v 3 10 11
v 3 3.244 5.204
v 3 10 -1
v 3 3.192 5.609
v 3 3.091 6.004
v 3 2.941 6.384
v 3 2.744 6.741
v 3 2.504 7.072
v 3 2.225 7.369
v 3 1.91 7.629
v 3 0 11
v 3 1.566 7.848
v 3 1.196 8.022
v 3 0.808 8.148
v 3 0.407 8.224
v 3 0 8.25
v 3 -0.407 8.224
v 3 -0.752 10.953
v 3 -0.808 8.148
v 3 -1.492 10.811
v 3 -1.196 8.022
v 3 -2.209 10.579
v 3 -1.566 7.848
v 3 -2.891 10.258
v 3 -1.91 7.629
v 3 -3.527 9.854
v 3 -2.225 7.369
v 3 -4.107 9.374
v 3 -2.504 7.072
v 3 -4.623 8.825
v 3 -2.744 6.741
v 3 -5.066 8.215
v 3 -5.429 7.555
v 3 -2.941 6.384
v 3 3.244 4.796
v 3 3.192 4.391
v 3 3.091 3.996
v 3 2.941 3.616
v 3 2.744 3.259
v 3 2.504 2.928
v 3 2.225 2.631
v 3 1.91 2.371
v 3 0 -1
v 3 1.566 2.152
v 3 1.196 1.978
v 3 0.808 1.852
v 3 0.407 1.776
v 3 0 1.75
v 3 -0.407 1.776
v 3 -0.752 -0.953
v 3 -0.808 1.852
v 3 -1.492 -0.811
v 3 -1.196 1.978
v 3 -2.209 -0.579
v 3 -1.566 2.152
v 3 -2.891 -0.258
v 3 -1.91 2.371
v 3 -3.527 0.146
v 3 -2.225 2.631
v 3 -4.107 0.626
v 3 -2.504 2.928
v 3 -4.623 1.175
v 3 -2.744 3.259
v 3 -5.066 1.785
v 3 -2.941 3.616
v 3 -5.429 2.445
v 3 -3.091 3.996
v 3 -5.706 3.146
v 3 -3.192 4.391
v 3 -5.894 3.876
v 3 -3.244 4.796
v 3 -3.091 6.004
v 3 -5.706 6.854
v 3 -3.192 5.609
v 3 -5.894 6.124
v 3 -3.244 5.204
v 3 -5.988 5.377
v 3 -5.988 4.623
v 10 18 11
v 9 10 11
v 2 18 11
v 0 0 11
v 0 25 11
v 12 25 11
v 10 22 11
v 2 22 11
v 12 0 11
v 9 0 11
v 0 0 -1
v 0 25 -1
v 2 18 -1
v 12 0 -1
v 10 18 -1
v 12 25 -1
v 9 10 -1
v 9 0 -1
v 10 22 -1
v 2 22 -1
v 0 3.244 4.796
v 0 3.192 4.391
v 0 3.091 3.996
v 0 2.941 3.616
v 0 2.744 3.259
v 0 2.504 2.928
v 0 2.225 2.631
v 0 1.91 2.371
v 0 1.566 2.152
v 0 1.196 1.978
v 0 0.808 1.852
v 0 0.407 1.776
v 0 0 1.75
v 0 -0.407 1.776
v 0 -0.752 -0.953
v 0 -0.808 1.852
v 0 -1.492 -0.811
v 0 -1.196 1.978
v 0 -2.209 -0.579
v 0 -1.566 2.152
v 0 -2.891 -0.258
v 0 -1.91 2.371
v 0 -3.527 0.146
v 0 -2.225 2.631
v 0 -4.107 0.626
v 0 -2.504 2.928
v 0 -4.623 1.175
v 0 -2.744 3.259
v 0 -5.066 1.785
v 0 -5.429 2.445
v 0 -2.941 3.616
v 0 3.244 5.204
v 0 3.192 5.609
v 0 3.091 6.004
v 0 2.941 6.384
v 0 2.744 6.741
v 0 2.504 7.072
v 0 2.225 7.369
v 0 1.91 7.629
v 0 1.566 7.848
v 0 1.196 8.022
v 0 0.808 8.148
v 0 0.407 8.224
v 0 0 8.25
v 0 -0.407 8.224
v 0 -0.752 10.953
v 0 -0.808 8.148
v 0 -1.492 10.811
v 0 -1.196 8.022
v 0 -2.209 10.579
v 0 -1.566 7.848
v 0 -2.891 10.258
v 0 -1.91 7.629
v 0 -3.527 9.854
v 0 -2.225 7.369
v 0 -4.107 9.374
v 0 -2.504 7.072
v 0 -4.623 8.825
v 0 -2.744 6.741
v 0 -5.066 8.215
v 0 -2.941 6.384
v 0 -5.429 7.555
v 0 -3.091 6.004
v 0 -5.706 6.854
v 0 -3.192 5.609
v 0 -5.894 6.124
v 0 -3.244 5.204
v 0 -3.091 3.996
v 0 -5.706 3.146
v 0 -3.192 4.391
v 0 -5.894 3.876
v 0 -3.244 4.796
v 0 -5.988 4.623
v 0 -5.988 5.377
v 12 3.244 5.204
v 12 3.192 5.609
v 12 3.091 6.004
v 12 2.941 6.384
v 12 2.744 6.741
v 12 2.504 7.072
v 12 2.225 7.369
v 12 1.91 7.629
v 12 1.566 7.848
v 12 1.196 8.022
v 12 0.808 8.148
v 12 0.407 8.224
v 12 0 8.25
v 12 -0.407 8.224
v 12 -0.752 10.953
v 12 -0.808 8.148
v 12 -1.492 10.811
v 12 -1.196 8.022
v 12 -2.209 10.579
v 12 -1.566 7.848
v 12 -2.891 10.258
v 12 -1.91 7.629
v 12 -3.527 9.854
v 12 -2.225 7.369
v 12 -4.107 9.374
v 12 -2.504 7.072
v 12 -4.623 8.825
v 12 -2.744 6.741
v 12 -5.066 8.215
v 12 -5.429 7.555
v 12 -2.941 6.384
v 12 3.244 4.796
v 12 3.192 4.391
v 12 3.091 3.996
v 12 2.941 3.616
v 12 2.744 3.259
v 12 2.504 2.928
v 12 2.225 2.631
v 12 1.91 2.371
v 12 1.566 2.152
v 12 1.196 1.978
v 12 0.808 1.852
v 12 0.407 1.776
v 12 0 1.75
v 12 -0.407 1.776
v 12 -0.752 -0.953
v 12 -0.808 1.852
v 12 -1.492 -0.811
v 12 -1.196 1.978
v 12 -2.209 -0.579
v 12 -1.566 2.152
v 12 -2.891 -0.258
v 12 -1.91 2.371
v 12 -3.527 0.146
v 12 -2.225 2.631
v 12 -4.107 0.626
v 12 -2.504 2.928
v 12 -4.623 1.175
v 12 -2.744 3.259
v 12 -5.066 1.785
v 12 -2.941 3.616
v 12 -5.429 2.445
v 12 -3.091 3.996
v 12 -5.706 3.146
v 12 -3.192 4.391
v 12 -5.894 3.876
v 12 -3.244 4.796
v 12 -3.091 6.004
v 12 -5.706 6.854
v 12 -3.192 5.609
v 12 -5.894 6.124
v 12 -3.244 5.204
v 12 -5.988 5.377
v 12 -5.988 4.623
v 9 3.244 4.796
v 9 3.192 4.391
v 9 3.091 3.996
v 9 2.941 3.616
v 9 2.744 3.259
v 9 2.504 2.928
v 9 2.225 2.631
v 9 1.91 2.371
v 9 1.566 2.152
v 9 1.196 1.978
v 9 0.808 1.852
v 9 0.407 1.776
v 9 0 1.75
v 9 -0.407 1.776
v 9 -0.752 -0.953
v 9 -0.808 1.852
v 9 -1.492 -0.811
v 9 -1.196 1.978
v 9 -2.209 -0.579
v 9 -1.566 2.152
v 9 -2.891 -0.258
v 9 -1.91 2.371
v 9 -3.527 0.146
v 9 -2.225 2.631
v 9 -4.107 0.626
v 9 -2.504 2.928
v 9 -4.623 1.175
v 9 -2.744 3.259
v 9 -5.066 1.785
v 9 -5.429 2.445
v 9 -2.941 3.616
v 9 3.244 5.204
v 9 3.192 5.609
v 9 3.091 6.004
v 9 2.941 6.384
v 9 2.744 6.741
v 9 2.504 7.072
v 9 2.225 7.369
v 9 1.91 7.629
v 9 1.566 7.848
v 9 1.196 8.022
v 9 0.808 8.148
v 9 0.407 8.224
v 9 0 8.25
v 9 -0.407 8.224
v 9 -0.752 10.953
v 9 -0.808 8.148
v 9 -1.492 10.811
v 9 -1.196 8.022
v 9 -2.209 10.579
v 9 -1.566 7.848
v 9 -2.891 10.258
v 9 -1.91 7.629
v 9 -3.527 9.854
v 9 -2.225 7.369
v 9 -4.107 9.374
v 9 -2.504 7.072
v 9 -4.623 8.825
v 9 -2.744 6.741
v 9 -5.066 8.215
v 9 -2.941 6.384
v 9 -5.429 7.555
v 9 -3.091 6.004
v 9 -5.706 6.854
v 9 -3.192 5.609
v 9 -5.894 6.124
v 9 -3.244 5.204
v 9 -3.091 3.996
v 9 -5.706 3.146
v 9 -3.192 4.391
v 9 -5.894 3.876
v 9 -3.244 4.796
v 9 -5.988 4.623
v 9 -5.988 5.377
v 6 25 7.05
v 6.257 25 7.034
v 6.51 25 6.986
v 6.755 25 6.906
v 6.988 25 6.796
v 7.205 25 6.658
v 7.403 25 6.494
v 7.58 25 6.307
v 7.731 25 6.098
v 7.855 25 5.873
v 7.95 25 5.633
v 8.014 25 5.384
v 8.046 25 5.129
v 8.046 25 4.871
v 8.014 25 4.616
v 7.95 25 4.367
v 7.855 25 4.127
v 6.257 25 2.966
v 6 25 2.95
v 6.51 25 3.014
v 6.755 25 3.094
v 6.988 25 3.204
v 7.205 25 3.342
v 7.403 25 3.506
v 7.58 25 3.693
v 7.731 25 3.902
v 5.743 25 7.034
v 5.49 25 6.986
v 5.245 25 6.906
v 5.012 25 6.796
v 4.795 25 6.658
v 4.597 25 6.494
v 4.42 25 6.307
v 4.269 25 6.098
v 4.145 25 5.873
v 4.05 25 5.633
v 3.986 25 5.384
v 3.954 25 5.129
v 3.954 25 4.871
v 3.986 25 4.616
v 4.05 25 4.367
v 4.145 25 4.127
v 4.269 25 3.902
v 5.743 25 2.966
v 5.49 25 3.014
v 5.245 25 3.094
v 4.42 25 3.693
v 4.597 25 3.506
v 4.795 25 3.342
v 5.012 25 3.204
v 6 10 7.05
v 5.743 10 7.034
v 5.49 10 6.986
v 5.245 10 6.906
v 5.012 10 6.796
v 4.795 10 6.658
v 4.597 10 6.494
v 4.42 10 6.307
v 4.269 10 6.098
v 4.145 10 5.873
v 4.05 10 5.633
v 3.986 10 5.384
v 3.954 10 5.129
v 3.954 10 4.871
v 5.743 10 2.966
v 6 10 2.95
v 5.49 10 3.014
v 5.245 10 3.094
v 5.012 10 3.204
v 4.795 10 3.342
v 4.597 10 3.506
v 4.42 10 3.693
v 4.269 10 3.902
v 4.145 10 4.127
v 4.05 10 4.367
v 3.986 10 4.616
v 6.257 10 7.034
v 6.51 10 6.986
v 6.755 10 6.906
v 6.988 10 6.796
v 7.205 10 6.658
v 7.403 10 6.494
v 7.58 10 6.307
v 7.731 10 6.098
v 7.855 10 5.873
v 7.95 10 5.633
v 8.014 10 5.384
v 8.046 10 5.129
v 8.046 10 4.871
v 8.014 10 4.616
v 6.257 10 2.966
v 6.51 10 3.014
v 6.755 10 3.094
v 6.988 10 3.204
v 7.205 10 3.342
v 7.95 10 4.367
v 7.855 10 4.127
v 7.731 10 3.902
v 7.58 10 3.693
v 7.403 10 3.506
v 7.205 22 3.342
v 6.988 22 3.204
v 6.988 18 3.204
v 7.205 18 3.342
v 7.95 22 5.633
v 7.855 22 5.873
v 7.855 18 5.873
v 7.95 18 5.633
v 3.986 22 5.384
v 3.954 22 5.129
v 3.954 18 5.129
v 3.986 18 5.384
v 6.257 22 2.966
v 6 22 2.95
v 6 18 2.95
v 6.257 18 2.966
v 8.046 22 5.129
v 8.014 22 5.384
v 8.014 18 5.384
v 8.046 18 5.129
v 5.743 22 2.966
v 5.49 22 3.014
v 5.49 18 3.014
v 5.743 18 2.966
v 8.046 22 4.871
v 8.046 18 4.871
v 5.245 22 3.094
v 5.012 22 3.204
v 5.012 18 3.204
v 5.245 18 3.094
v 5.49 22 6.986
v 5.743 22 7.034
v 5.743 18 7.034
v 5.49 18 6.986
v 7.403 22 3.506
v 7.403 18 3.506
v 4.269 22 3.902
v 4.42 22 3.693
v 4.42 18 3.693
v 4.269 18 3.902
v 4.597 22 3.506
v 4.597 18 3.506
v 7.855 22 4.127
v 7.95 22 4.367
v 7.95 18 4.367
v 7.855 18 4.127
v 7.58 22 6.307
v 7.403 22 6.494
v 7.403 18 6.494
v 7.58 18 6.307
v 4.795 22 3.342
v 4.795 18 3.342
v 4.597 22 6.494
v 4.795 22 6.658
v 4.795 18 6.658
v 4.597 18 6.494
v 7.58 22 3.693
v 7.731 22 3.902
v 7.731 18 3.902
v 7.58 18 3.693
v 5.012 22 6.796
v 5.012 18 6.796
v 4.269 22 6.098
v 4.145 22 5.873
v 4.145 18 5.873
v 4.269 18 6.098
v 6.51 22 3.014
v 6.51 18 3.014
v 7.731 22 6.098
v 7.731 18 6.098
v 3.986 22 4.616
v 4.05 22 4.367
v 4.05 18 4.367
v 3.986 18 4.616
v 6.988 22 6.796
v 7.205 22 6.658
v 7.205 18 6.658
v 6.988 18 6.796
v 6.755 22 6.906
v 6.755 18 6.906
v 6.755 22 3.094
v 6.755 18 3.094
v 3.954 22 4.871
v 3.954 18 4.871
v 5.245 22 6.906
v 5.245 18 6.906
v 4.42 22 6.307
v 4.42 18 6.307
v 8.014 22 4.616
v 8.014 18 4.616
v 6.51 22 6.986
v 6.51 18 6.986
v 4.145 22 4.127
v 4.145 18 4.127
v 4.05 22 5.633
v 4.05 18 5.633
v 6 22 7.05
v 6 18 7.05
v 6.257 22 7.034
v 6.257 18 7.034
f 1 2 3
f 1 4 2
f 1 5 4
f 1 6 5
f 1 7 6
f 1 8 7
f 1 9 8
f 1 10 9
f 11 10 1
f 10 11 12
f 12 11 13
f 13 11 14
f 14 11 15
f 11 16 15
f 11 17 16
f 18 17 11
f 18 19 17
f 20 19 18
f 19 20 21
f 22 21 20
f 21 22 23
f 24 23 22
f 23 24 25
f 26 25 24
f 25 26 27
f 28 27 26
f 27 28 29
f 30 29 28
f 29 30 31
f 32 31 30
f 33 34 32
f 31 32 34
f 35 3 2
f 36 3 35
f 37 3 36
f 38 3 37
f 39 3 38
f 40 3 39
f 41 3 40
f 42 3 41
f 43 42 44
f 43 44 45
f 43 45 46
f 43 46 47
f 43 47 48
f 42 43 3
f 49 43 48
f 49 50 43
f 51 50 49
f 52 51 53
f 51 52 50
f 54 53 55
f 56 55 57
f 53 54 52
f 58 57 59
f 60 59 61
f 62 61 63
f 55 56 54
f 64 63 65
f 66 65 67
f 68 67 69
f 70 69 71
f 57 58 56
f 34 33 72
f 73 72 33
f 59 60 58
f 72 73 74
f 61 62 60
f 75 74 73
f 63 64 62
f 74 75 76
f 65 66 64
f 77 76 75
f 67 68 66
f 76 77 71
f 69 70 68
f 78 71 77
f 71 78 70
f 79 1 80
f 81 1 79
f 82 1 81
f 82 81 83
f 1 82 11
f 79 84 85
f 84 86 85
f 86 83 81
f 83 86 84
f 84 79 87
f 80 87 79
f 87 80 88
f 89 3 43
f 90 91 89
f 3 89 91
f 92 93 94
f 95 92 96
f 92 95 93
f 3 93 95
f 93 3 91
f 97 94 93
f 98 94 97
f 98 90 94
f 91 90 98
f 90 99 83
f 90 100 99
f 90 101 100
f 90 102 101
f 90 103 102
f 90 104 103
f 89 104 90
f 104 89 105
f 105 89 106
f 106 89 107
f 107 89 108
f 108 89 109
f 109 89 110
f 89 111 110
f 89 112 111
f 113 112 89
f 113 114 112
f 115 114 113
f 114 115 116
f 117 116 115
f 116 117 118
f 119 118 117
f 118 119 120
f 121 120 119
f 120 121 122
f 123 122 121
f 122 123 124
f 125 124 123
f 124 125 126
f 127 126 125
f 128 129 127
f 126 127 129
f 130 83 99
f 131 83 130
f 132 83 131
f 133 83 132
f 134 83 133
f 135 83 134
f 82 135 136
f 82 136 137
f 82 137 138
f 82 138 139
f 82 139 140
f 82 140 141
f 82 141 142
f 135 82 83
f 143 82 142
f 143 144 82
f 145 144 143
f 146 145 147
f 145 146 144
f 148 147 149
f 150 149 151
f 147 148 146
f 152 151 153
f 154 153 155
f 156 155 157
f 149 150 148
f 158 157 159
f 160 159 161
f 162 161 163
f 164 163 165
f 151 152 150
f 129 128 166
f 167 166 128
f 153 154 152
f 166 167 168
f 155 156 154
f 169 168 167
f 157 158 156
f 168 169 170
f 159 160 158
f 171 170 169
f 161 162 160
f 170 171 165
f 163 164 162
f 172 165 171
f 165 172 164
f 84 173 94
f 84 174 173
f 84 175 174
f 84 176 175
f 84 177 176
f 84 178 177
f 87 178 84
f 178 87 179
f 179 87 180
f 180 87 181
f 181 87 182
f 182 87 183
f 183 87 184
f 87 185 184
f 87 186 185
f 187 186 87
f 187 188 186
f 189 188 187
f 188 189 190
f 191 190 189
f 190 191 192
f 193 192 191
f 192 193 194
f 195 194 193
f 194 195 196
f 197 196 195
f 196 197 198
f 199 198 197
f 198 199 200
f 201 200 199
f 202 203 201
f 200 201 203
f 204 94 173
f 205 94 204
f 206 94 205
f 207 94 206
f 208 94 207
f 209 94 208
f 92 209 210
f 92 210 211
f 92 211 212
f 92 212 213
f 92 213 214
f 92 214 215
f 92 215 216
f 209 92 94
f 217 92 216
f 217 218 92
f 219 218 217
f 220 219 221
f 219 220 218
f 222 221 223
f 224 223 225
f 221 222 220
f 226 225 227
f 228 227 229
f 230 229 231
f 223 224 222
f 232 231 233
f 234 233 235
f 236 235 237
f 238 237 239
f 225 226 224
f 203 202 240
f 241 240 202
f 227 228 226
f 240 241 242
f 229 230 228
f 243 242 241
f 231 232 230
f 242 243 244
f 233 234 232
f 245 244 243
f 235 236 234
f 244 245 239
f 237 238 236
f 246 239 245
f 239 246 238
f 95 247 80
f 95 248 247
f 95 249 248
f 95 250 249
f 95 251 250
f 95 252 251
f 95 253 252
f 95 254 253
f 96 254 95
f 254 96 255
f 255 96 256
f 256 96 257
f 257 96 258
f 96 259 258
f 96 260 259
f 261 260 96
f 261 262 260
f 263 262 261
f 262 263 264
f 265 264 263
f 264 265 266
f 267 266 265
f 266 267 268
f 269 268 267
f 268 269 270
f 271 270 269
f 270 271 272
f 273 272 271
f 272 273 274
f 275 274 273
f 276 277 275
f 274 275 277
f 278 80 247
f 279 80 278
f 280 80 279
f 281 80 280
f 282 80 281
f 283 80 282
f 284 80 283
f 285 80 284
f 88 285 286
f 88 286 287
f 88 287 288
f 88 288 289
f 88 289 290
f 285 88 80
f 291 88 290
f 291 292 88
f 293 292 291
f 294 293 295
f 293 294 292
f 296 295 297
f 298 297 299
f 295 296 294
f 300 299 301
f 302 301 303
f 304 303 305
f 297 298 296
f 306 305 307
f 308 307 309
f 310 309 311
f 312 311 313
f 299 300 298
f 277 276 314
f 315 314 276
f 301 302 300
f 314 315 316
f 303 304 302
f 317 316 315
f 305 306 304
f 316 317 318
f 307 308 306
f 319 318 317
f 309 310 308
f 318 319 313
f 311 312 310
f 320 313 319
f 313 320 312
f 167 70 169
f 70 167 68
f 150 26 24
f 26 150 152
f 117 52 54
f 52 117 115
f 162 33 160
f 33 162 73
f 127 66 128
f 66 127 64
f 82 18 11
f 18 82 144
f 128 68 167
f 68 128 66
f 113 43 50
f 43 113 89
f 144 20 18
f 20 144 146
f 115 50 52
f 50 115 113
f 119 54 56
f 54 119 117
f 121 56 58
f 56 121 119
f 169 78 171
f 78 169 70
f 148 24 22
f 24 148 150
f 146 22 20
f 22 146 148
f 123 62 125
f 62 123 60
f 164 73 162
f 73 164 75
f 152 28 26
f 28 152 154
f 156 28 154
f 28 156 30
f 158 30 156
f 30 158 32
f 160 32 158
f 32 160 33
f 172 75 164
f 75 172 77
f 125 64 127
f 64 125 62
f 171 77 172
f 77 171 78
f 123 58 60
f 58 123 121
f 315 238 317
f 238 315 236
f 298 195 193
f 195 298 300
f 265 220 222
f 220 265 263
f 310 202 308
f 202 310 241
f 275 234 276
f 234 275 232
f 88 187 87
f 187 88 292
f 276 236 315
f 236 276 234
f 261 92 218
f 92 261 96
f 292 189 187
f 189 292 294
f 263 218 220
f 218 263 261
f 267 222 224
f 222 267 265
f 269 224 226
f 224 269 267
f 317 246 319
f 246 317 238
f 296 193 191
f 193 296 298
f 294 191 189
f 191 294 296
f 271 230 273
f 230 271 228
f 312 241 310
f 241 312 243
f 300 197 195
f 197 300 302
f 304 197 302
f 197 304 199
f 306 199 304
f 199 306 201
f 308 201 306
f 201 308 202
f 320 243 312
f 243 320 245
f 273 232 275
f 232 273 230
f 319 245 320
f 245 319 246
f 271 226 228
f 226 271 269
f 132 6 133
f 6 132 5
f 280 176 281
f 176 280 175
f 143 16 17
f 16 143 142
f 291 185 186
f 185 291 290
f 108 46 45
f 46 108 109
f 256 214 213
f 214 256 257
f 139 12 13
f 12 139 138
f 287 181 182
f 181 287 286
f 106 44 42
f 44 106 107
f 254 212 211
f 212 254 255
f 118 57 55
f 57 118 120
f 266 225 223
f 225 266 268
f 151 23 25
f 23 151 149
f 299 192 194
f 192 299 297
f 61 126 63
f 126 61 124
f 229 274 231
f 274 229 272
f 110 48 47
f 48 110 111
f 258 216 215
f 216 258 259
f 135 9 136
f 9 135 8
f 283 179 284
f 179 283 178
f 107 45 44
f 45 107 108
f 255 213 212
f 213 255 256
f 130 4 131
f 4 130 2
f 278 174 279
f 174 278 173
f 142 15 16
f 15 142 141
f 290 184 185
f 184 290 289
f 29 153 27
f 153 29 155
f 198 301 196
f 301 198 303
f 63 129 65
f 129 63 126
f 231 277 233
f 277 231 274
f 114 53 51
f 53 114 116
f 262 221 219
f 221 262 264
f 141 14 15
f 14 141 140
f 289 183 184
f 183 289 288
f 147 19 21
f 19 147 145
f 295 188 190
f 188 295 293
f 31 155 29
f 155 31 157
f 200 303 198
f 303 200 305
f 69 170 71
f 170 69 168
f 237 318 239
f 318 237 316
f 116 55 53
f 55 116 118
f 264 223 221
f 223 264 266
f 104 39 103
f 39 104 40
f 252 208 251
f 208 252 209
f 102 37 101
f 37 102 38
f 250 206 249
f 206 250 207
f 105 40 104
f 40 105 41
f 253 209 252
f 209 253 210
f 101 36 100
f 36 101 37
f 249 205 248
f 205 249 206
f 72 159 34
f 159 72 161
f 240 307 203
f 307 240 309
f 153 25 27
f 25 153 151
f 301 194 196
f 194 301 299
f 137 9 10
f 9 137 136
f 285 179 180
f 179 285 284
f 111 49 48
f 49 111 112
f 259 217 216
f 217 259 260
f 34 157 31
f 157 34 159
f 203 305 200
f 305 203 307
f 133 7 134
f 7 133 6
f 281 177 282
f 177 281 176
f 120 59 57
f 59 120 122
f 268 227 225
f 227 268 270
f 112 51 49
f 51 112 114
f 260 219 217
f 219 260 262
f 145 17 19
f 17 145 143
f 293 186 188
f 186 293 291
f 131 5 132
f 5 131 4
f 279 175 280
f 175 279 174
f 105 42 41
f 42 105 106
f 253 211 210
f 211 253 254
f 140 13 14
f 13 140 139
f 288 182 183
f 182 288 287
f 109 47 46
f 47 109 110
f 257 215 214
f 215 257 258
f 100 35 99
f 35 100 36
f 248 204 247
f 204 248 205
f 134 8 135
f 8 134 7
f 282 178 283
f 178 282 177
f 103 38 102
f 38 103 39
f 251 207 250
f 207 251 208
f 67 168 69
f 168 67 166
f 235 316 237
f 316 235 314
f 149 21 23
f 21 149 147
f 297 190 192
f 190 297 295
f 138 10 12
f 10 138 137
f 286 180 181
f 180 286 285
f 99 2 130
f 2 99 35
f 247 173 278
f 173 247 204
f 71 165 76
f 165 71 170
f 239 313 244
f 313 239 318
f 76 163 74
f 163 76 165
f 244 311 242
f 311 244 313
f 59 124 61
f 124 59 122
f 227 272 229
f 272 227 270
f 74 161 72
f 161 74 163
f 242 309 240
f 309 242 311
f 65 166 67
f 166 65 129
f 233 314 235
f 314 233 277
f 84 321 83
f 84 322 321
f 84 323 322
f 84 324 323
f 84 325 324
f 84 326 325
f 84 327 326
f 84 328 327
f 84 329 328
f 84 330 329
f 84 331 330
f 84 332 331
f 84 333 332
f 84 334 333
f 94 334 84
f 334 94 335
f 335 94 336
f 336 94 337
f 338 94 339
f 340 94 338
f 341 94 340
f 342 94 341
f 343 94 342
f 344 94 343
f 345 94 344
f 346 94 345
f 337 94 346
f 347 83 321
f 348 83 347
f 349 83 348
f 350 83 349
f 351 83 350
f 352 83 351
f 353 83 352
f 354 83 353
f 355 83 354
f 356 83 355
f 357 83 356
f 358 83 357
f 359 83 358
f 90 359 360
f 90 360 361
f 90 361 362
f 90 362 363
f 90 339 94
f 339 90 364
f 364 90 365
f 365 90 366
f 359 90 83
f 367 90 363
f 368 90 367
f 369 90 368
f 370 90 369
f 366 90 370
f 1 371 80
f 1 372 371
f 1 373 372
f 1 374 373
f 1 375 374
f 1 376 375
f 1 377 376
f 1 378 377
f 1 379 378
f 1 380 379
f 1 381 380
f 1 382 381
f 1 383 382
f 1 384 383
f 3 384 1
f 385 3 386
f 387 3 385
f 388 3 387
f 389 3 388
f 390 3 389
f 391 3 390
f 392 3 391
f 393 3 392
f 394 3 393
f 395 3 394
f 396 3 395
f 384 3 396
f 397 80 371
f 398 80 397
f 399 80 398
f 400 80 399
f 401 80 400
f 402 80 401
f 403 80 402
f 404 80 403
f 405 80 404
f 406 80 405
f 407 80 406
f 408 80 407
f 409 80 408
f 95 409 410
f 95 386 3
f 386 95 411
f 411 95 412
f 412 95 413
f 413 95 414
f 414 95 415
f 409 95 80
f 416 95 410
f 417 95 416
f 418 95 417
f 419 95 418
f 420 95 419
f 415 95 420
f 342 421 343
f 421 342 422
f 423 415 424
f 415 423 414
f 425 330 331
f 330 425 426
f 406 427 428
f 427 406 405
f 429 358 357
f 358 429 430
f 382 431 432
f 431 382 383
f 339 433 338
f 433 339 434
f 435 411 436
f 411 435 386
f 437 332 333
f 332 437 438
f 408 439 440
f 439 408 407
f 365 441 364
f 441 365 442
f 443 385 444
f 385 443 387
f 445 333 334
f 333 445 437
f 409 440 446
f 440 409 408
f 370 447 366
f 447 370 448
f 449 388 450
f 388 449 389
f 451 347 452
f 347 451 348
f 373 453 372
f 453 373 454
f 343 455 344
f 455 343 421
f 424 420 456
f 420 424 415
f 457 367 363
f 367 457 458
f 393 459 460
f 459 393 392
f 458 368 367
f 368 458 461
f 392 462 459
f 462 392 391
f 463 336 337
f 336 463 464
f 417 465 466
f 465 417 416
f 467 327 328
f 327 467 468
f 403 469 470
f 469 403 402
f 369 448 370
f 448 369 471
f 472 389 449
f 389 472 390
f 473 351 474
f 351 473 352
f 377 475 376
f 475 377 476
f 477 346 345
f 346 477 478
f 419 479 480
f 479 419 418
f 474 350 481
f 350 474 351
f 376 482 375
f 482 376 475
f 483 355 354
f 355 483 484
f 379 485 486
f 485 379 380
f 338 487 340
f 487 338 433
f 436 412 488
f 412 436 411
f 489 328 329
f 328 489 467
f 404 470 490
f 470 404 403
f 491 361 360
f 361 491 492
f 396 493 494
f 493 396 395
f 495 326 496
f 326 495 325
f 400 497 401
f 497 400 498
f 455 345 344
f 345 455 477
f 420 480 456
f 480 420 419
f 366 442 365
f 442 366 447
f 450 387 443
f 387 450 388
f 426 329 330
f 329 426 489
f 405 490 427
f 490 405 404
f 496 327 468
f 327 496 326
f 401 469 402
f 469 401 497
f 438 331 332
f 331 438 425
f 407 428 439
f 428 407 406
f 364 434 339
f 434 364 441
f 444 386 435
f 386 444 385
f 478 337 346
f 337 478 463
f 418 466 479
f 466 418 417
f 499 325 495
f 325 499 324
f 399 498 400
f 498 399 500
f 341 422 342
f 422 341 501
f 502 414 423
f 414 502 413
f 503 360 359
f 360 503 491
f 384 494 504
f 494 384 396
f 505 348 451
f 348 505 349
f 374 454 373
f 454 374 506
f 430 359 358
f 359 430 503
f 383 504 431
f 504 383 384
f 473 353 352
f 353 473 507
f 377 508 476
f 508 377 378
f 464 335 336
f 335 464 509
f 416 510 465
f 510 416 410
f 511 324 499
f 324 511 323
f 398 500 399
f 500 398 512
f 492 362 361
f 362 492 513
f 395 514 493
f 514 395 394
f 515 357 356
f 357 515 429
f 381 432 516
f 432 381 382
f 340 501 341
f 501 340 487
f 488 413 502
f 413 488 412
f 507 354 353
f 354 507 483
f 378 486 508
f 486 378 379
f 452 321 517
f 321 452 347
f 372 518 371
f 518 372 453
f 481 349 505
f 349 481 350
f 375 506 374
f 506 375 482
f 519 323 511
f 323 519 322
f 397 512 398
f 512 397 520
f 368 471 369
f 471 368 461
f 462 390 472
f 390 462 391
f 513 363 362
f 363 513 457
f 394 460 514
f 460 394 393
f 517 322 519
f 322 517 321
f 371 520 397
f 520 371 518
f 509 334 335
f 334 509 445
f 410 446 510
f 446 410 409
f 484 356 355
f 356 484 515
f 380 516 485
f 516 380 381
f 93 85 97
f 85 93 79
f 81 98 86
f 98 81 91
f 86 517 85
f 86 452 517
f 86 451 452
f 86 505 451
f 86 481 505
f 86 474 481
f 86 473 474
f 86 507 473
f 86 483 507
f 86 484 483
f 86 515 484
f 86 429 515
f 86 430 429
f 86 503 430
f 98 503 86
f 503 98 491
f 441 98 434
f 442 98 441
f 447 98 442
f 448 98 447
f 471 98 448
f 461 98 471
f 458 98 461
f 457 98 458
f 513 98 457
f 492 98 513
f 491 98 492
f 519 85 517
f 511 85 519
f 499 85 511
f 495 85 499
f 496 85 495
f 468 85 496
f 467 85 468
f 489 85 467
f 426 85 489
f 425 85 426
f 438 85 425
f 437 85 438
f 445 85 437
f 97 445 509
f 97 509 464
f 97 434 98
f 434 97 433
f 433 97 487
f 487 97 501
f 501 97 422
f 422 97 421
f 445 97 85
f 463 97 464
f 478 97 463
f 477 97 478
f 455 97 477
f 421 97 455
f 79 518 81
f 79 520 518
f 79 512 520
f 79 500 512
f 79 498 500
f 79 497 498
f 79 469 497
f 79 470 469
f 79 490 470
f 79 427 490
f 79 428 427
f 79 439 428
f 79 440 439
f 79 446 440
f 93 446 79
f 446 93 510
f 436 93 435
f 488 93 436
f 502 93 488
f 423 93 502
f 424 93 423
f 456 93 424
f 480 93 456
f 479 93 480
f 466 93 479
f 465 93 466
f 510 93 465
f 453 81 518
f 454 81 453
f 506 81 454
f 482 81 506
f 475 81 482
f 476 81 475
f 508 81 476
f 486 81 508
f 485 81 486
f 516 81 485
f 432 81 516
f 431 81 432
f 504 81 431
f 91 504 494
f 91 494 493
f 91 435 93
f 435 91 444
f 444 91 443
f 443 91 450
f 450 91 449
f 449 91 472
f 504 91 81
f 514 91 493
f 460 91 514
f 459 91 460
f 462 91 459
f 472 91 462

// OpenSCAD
$fn=50;

difference()//forchetta
	{
	union()
		{
		translate([0,0,-1]) cube([3,15,12]);
		translate([9,0,-1]) cube([3,15,12]);
		
		translate([0,0,5]) rotate ([0,90,0]) cylinder(d=12,h=3);
		translate([9,0,5]) rotate ([0,90,0]) cylinder(d=12,h=3);
		}
	translate([-5,0,5]) rotate([0,90,0]) cylinder(d=6.5,h=20);
	}

difference()
	{
	translate([0,10,-1]) cube([12,15,12]);
	translate([6,28,5]) rotate([90,90,0]) cylinder(d=4.1,h=20);
	translate([2,18,-2]) cube([8,4,20]);
	}
